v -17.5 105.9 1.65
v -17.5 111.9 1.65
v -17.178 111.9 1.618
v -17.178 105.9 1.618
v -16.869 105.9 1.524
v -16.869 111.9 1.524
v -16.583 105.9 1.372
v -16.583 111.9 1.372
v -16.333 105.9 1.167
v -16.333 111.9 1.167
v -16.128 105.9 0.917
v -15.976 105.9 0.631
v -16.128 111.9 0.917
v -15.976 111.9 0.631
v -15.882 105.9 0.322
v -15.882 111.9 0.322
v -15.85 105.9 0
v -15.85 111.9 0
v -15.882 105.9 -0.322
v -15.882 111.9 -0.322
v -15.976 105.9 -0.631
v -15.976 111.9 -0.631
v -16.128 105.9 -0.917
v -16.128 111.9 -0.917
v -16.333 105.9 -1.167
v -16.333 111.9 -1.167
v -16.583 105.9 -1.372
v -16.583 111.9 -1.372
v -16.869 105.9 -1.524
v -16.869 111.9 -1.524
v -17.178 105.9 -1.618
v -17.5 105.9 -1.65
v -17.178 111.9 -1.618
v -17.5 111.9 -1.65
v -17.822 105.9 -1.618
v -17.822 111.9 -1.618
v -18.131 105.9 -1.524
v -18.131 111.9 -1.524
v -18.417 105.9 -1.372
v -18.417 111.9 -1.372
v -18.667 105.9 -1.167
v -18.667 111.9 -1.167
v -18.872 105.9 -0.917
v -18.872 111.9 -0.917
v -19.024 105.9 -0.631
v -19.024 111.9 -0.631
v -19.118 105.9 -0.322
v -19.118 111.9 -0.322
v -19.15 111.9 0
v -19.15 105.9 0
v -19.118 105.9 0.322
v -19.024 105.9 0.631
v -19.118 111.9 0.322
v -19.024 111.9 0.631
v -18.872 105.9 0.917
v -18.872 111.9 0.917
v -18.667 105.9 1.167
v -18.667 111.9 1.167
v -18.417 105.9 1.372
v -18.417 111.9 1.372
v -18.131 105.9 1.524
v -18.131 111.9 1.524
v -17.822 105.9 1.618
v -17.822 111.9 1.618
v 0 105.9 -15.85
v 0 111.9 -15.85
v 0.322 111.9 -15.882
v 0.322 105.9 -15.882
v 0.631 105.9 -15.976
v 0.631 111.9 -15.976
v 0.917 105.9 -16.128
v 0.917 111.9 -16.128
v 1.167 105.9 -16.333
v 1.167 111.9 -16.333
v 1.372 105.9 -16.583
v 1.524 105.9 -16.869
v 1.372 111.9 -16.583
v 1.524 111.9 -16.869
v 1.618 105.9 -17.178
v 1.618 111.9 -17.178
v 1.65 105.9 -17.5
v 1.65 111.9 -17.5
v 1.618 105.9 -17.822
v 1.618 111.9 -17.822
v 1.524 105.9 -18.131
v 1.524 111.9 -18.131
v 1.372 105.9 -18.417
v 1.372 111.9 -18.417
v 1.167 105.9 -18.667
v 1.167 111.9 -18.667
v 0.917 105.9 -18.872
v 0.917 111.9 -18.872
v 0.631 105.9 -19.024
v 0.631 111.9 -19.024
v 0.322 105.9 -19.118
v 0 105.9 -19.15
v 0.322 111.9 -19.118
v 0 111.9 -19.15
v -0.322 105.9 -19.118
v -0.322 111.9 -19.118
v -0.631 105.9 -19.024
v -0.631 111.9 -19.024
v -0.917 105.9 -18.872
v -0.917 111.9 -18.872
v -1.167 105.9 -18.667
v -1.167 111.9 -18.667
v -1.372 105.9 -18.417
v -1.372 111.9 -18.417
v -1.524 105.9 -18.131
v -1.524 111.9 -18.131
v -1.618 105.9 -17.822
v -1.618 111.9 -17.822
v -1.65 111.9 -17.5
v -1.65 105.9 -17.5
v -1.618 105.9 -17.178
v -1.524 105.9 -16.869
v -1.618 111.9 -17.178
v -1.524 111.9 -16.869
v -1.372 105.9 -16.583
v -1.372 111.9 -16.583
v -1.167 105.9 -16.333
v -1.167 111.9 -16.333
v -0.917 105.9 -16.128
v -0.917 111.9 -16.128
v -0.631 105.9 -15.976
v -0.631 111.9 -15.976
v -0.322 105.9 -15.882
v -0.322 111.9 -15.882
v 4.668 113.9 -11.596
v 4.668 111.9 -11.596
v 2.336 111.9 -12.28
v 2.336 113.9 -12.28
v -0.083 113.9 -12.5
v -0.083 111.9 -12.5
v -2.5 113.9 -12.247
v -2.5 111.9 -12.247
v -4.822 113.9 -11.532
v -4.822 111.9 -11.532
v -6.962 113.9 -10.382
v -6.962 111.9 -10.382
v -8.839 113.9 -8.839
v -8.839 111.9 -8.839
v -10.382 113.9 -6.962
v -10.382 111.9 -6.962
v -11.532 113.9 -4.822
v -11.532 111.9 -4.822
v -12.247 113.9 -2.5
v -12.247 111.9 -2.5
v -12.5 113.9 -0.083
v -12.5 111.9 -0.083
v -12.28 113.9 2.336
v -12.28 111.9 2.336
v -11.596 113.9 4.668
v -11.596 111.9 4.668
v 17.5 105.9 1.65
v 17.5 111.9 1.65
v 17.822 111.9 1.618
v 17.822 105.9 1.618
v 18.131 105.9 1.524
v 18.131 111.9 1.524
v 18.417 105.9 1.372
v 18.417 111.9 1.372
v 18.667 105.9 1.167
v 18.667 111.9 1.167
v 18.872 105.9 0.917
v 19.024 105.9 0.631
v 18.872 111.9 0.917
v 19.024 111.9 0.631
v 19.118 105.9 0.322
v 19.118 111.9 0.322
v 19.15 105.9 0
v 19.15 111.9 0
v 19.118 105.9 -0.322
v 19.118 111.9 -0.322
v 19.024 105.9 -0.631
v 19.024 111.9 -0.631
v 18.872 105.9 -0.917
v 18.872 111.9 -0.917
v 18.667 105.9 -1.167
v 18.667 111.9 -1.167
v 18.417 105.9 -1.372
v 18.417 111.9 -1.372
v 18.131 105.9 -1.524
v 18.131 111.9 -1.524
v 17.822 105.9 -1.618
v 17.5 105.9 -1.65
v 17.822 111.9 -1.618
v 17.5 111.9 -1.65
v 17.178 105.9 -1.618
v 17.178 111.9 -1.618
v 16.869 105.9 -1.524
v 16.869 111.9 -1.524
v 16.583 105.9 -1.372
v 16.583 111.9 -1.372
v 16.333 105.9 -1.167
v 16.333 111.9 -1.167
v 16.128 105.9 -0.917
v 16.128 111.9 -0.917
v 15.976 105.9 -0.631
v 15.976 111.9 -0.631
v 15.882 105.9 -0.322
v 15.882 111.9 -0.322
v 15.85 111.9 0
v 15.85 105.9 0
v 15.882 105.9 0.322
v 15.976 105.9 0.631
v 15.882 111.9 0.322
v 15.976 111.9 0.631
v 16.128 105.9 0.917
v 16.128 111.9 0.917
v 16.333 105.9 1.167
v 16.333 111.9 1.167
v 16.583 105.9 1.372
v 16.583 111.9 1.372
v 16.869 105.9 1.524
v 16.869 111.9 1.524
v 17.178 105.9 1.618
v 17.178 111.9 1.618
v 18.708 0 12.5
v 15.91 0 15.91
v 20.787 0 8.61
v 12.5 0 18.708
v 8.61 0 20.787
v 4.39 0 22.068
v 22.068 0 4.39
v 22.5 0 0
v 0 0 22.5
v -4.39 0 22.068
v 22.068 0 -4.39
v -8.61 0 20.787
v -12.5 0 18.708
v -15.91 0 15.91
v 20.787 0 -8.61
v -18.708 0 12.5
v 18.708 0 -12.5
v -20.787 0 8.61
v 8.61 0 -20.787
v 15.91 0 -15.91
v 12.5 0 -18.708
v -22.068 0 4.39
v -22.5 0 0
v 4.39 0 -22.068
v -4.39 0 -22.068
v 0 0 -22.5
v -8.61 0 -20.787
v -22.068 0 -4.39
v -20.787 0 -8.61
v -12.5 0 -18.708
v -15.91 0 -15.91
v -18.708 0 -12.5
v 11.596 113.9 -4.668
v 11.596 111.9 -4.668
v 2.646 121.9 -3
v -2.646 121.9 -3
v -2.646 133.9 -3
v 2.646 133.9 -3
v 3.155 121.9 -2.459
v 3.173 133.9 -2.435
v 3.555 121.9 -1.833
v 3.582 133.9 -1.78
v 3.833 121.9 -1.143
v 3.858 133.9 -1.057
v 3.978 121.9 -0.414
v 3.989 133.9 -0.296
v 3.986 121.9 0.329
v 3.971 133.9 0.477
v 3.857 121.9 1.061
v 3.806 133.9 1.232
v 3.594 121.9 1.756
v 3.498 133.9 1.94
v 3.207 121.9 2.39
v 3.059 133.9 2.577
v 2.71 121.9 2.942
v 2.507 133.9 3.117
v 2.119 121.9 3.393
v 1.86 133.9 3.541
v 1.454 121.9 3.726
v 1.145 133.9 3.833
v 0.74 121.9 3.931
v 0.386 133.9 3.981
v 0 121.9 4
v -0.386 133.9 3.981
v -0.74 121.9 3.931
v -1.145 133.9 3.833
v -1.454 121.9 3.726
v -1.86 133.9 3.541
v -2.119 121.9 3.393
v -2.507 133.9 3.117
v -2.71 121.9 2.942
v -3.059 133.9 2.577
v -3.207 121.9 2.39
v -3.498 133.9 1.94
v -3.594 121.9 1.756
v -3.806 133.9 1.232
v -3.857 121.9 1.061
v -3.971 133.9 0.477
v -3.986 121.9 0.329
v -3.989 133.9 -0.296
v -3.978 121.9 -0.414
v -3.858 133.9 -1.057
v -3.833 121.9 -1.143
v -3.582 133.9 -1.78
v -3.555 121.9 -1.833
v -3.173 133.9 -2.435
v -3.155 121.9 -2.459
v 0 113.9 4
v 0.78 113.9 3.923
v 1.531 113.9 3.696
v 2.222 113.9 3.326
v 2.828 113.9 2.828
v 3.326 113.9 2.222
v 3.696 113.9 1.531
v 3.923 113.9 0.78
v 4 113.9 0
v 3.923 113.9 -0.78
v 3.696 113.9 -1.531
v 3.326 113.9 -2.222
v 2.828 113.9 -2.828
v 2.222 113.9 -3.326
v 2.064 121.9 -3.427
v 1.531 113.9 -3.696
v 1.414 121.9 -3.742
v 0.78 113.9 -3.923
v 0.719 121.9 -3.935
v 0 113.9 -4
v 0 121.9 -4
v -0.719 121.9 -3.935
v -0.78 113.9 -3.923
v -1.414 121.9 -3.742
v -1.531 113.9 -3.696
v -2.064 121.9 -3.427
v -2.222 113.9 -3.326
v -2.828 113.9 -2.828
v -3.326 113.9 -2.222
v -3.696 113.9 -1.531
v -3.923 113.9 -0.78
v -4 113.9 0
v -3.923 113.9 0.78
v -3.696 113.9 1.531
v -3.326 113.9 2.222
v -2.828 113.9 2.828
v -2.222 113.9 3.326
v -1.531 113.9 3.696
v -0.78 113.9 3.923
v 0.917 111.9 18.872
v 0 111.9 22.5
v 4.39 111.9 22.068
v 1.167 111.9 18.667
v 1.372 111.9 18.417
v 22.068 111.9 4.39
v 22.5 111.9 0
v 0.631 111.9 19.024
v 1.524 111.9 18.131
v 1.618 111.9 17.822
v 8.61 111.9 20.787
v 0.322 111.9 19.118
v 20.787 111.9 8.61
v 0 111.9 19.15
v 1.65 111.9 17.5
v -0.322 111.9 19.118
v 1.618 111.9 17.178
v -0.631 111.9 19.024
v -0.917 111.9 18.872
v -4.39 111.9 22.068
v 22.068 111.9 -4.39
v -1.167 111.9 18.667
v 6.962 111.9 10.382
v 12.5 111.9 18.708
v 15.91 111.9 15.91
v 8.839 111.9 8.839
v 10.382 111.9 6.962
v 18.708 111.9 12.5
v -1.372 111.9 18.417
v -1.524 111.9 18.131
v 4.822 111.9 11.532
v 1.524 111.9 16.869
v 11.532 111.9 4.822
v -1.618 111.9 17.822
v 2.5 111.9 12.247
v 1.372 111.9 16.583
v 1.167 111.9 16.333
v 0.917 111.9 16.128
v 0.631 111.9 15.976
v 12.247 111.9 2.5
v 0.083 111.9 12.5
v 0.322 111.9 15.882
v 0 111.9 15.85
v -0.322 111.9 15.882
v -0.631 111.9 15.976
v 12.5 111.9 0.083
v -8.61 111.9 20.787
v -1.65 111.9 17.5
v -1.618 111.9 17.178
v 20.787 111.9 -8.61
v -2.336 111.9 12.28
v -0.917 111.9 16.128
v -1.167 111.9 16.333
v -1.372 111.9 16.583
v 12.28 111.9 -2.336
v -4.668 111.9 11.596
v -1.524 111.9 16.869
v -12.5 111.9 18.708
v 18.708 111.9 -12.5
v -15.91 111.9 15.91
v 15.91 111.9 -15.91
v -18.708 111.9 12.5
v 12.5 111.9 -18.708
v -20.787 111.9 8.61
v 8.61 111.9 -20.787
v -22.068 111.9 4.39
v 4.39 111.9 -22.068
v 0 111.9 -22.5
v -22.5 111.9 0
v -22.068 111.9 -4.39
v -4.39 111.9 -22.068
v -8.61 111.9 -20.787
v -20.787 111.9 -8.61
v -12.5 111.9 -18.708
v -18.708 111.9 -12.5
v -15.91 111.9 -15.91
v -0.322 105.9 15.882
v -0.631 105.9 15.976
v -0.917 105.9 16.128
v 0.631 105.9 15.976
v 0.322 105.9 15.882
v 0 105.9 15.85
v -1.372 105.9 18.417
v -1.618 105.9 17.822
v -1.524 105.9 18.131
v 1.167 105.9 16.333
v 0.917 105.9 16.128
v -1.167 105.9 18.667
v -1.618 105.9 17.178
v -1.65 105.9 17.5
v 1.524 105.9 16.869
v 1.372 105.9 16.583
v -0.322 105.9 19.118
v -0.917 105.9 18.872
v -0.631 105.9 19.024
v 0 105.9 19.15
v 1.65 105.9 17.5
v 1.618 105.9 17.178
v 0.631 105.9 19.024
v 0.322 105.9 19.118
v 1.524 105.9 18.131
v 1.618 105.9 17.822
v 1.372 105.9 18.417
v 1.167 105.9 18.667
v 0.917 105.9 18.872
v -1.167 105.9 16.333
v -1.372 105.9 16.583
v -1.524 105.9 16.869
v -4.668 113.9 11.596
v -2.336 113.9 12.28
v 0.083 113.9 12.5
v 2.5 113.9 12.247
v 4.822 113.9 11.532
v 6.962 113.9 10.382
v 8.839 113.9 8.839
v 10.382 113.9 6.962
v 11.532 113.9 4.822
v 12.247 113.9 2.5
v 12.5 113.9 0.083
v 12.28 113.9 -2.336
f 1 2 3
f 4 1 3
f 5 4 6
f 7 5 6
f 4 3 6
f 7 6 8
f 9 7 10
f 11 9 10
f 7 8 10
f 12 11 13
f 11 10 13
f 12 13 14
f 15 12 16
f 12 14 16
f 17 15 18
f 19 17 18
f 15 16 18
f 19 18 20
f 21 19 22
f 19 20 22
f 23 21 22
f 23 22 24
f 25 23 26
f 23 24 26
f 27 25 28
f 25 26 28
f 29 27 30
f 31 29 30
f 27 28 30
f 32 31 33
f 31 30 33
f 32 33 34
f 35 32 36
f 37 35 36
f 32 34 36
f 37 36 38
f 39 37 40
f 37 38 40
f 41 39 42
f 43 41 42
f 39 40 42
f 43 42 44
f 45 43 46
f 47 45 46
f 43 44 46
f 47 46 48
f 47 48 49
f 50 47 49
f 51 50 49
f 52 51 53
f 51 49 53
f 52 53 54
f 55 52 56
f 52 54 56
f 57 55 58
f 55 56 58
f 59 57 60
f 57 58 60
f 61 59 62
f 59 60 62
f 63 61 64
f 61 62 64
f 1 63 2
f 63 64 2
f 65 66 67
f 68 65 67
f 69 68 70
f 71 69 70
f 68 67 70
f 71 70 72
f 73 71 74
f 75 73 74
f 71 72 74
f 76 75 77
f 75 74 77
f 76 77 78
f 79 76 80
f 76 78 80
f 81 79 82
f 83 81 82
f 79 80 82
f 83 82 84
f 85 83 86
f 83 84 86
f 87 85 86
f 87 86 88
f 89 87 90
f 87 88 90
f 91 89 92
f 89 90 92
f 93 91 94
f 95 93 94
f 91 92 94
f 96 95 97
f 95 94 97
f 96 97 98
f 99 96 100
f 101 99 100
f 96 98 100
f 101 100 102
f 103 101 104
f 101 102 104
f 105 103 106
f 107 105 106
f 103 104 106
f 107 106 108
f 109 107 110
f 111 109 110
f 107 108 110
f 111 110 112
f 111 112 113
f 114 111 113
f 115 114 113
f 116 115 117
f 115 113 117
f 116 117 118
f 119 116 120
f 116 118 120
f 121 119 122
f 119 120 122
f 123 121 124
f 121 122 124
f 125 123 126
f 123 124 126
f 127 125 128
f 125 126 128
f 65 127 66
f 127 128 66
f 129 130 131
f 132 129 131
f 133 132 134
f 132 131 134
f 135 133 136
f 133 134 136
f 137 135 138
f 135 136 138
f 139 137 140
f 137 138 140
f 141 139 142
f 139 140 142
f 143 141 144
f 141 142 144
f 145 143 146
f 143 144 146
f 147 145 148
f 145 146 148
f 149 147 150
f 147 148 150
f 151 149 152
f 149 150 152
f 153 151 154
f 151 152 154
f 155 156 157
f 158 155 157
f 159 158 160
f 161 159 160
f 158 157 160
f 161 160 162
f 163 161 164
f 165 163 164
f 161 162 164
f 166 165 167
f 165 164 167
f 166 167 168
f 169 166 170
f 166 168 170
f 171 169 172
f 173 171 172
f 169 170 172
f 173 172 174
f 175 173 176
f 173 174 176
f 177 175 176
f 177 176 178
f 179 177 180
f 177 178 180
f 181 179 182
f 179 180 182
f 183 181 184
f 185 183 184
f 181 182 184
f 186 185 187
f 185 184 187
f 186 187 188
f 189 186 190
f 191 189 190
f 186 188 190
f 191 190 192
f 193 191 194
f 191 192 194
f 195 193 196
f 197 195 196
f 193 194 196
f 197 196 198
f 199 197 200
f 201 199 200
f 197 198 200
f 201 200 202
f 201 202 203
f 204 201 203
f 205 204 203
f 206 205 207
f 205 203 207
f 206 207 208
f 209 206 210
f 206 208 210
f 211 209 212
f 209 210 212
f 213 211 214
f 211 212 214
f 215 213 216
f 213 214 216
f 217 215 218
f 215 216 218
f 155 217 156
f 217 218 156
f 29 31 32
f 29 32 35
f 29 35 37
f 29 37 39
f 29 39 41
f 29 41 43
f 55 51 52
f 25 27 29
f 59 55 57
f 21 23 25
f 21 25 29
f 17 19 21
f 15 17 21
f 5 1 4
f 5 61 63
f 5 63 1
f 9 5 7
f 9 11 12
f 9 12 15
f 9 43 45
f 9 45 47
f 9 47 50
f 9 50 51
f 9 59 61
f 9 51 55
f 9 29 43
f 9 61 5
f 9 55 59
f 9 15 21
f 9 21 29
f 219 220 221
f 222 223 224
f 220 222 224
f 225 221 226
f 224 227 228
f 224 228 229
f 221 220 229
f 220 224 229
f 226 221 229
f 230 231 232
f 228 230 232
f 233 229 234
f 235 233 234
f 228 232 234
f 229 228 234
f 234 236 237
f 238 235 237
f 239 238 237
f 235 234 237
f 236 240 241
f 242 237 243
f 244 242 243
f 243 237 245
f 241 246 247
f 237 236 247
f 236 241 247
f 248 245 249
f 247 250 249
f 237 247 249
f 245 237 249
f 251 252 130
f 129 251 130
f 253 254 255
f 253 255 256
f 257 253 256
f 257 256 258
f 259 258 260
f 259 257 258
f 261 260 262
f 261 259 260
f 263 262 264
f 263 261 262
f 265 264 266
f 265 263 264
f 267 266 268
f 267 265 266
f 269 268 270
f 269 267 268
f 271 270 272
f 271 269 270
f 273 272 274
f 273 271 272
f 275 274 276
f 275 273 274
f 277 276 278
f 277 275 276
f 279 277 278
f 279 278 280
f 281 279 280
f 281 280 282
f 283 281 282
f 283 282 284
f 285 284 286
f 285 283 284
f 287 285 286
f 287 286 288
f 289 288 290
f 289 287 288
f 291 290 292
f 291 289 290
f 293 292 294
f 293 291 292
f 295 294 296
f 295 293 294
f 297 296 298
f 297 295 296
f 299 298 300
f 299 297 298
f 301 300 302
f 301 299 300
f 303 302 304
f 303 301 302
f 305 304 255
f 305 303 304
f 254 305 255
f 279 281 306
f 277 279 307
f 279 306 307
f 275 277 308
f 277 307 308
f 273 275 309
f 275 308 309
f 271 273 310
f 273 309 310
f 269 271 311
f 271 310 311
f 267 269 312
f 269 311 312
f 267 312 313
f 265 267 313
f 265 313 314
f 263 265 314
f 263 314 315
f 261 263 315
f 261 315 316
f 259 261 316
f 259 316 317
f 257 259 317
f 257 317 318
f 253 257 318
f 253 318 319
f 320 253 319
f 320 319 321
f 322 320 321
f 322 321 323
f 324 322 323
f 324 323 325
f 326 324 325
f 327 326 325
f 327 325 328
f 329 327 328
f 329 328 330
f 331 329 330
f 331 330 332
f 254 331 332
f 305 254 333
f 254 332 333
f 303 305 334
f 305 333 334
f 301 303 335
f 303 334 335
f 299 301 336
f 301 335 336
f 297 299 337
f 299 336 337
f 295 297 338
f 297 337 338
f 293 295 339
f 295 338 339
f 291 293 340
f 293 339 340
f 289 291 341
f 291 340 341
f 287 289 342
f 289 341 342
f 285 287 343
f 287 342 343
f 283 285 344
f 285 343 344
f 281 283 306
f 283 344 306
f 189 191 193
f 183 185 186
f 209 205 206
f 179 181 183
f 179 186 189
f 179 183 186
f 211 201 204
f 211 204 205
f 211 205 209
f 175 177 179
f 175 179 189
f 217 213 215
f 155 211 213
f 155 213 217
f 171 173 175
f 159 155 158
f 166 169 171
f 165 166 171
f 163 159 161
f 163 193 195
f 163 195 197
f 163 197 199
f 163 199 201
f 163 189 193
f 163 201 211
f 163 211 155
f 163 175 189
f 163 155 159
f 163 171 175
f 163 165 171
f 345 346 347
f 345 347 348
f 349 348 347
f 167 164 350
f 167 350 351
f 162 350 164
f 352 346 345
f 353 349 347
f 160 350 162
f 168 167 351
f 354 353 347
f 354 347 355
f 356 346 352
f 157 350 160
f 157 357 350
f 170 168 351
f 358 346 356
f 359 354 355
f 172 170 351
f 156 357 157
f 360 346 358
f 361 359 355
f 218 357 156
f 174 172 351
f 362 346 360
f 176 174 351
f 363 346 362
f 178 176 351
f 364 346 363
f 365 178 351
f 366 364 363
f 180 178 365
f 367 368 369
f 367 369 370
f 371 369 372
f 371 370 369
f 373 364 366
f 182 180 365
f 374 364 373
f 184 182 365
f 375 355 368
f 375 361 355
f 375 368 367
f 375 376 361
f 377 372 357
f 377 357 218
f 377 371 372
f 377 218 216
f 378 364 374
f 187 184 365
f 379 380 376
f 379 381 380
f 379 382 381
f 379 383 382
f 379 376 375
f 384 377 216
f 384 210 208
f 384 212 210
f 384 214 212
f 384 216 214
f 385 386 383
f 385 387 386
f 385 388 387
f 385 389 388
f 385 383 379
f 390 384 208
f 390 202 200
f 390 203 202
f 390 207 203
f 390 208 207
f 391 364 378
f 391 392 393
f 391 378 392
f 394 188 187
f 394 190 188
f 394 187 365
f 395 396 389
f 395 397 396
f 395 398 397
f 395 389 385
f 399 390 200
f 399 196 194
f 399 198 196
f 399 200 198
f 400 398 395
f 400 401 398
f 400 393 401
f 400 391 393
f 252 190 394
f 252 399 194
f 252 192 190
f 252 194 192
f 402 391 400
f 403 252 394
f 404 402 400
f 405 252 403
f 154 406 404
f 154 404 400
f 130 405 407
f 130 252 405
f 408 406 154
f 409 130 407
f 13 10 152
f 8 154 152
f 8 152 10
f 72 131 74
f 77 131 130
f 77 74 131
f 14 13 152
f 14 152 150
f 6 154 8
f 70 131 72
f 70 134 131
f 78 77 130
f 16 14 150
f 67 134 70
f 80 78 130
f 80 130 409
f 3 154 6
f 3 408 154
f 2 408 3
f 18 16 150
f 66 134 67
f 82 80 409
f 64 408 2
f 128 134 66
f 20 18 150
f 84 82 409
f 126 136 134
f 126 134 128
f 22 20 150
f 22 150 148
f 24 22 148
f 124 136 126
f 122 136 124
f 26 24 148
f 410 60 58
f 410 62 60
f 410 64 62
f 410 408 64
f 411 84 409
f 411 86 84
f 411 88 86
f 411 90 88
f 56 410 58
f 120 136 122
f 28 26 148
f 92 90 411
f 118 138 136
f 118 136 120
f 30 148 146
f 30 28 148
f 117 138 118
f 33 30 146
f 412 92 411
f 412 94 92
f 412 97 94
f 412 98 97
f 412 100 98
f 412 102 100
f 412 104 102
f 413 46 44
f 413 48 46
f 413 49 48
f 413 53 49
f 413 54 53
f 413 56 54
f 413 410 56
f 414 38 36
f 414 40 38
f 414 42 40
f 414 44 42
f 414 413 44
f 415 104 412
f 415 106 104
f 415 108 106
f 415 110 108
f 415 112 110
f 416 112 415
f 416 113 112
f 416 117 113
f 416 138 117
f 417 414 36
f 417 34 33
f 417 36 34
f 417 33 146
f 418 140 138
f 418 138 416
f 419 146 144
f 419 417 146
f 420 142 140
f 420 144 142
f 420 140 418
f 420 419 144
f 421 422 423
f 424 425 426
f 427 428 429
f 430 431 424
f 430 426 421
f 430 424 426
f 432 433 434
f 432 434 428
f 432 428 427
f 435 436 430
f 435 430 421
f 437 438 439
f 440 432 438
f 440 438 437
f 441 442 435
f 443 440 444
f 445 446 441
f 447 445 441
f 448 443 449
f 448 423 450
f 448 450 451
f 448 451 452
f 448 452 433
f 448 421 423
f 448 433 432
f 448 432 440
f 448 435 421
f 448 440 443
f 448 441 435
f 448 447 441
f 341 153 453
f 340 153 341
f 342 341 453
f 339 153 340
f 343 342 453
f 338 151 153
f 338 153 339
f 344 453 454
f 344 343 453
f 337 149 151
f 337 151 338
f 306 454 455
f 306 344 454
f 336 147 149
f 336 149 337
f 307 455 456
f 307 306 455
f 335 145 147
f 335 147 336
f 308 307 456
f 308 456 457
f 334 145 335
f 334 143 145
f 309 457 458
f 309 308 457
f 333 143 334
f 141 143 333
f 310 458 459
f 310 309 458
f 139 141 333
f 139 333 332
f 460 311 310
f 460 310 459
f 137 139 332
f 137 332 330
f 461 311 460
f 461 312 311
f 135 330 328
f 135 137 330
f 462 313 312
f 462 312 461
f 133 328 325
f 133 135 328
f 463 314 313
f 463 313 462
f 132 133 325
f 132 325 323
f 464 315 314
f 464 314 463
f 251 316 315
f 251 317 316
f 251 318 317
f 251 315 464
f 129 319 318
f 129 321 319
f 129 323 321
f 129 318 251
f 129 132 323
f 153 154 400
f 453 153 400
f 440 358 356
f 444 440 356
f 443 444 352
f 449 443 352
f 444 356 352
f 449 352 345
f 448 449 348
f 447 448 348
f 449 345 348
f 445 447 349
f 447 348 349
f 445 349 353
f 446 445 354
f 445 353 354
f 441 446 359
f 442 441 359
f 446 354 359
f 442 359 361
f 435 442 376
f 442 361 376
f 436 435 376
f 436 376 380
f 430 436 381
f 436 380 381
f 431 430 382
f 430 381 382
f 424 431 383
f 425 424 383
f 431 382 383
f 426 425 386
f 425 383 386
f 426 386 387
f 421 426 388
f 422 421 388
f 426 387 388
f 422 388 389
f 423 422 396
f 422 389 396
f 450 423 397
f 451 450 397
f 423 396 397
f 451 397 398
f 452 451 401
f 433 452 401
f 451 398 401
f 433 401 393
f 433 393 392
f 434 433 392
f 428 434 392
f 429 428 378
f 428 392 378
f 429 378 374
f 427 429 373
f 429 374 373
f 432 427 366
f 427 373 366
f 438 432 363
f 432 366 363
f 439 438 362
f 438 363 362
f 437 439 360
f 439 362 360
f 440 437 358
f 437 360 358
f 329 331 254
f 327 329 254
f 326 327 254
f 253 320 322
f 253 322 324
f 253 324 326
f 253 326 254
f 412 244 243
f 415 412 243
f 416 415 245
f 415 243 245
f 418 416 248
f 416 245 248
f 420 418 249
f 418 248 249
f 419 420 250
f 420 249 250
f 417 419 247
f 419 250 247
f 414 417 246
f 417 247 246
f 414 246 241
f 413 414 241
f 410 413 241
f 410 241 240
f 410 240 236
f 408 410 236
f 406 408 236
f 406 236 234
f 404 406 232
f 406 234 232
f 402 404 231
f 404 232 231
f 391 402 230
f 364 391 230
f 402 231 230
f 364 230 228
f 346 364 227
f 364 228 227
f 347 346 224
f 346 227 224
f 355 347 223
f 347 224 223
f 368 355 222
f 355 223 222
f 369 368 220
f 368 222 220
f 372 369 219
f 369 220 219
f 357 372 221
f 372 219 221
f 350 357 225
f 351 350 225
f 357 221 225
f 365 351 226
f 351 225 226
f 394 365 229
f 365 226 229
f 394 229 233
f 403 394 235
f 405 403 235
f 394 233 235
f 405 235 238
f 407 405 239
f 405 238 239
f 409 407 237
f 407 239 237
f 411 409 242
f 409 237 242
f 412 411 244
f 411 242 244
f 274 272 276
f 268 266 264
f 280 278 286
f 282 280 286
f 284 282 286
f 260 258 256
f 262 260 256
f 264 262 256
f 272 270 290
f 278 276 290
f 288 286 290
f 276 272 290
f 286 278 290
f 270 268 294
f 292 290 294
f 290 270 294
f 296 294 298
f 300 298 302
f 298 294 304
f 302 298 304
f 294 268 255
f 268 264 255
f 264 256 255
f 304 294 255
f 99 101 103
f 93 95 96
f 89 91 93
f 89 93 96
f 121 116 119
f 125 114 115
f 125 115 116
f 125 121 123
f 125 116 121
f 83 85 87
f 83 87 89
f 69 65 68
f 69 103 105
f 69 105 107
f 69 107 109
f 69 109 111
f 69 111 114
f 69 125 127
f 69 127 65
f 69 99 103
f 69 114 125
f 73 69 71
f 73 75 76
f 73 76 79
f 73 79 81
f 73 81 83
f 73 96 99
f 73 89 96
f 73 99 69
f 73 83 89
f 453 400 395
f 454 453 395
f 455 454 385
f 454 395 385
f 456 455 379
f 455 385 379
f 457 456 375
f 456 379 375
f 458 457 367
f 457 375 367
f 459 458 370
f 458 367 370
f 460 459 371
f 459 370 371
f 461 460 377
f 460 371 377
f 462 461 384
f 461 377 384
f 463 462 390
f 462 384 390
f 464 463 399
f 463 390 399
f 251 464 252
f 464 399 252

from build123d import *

# Parameters (mm, degrees)
SKETCH1_R           = 22.5
BOSS_EXTRUDE1_DEPTH = 111.9
BOSS_EXTRUDE2_DEPTH = 2
SKETCH3_R           = 4
BOSS_EXTRUDE3_DEPTH = 8
BOSS_EXTRUDE4_DEPTH = 12
SKETCH5_R           = 1.65
CUT_EXTRUDE1_DEPTH  = 6


with BuildPart() as part:
    # Sketch1 → Boss-Extrude1 (new body)
    with BuildSketch(Plane(origin=(0, 0, 0), x_dir=(1, 0, 0), z_dir=(0, 1, 0))):
        with Locations(Location((0, 0, 0), (0, 0, 90))):
            Circle(SKETCH1_R)
    extrude(amount=BOSS_EXTRUDE1_DEPTH)

    # Sketch2 → Boss-Extrude2 (add)
    with BuildSketch(Plane(origin=(0, 111.9, 0), x_dir=(1, 0, 0), z_dir=(0, 1, 0))):
        with BuildLine():
            Line((-11.59583, -4.667626), (-4.667626, -11.59583))
            ThreePointArc((-4.667626, -11.59583), (8.838835, -8.838835), (11.59583, 4.667626))
            Line((11.59583, 4.667626), (4.667626, 11.59583))
            ThreePointArc((4.667626, 11.59583), (-8.838835, 8.838835), (-11.59583, -4.667626))
        make_face()
    extrude(amount=BOSS_EXTRUDE2_DEPTH)

    # Sketch3 → Boss-Extrude3 (add)
    with BuildSketch(Plane(origin=(0, 113.9, 0), x_dir=(1, 0, 0), z_dir=(0, 1, 0))):
        with Locations(Location((0, 0, 0), (0, 0, 270))):
            Circle(SKETCH3_R)
    extrude(amount=BOSS_EXTRUDE3_DEPTH)

    # Sketch4 → Boss-Extrude4 (add)
    with BuildSketch(Plane(origin=(0, 121.9, 0), x_dir=(1, 0, 0), z_dir=(0, 1, 0))):
        with BuildLine():
            Line((-2.645751, 3), (2.645751, 3))
            ThreePointArc((2.645751, 3), (0, -4), (-2.645751, 3))
        make_face()
    extrude(amount=BOSS_EXTRUDE4_DEPTH)

    # Sketch5 → Cut-Extrude1 (cut)
    with BuildSketch(Plane(origin=(0, 111.9, 0), x_dir=(1, 0, 0), z_dir=(0, 1, 0))):
        with Locations(Location((-17.5, 0, 0), (0, 0, 270))):
            Circle(SKETCH5_R)
        with Locations(Location((0, 17.5, 0), (0, 0, 270))):
            Circle(SKETCH5_R)
        with Locations(Location((17.5, 0, 0), (0, 0, 270))):
            Circle(SKETCH5_R)
        with Locations(Location((0, -17.5, 0), (0, 0, 270))):
            Circle(SKETCH5_R)
    extrude(amount=-CUT_EXTRUDE1_DEPTH, mode=Mode.SUBTRACT)


solid = part.part
